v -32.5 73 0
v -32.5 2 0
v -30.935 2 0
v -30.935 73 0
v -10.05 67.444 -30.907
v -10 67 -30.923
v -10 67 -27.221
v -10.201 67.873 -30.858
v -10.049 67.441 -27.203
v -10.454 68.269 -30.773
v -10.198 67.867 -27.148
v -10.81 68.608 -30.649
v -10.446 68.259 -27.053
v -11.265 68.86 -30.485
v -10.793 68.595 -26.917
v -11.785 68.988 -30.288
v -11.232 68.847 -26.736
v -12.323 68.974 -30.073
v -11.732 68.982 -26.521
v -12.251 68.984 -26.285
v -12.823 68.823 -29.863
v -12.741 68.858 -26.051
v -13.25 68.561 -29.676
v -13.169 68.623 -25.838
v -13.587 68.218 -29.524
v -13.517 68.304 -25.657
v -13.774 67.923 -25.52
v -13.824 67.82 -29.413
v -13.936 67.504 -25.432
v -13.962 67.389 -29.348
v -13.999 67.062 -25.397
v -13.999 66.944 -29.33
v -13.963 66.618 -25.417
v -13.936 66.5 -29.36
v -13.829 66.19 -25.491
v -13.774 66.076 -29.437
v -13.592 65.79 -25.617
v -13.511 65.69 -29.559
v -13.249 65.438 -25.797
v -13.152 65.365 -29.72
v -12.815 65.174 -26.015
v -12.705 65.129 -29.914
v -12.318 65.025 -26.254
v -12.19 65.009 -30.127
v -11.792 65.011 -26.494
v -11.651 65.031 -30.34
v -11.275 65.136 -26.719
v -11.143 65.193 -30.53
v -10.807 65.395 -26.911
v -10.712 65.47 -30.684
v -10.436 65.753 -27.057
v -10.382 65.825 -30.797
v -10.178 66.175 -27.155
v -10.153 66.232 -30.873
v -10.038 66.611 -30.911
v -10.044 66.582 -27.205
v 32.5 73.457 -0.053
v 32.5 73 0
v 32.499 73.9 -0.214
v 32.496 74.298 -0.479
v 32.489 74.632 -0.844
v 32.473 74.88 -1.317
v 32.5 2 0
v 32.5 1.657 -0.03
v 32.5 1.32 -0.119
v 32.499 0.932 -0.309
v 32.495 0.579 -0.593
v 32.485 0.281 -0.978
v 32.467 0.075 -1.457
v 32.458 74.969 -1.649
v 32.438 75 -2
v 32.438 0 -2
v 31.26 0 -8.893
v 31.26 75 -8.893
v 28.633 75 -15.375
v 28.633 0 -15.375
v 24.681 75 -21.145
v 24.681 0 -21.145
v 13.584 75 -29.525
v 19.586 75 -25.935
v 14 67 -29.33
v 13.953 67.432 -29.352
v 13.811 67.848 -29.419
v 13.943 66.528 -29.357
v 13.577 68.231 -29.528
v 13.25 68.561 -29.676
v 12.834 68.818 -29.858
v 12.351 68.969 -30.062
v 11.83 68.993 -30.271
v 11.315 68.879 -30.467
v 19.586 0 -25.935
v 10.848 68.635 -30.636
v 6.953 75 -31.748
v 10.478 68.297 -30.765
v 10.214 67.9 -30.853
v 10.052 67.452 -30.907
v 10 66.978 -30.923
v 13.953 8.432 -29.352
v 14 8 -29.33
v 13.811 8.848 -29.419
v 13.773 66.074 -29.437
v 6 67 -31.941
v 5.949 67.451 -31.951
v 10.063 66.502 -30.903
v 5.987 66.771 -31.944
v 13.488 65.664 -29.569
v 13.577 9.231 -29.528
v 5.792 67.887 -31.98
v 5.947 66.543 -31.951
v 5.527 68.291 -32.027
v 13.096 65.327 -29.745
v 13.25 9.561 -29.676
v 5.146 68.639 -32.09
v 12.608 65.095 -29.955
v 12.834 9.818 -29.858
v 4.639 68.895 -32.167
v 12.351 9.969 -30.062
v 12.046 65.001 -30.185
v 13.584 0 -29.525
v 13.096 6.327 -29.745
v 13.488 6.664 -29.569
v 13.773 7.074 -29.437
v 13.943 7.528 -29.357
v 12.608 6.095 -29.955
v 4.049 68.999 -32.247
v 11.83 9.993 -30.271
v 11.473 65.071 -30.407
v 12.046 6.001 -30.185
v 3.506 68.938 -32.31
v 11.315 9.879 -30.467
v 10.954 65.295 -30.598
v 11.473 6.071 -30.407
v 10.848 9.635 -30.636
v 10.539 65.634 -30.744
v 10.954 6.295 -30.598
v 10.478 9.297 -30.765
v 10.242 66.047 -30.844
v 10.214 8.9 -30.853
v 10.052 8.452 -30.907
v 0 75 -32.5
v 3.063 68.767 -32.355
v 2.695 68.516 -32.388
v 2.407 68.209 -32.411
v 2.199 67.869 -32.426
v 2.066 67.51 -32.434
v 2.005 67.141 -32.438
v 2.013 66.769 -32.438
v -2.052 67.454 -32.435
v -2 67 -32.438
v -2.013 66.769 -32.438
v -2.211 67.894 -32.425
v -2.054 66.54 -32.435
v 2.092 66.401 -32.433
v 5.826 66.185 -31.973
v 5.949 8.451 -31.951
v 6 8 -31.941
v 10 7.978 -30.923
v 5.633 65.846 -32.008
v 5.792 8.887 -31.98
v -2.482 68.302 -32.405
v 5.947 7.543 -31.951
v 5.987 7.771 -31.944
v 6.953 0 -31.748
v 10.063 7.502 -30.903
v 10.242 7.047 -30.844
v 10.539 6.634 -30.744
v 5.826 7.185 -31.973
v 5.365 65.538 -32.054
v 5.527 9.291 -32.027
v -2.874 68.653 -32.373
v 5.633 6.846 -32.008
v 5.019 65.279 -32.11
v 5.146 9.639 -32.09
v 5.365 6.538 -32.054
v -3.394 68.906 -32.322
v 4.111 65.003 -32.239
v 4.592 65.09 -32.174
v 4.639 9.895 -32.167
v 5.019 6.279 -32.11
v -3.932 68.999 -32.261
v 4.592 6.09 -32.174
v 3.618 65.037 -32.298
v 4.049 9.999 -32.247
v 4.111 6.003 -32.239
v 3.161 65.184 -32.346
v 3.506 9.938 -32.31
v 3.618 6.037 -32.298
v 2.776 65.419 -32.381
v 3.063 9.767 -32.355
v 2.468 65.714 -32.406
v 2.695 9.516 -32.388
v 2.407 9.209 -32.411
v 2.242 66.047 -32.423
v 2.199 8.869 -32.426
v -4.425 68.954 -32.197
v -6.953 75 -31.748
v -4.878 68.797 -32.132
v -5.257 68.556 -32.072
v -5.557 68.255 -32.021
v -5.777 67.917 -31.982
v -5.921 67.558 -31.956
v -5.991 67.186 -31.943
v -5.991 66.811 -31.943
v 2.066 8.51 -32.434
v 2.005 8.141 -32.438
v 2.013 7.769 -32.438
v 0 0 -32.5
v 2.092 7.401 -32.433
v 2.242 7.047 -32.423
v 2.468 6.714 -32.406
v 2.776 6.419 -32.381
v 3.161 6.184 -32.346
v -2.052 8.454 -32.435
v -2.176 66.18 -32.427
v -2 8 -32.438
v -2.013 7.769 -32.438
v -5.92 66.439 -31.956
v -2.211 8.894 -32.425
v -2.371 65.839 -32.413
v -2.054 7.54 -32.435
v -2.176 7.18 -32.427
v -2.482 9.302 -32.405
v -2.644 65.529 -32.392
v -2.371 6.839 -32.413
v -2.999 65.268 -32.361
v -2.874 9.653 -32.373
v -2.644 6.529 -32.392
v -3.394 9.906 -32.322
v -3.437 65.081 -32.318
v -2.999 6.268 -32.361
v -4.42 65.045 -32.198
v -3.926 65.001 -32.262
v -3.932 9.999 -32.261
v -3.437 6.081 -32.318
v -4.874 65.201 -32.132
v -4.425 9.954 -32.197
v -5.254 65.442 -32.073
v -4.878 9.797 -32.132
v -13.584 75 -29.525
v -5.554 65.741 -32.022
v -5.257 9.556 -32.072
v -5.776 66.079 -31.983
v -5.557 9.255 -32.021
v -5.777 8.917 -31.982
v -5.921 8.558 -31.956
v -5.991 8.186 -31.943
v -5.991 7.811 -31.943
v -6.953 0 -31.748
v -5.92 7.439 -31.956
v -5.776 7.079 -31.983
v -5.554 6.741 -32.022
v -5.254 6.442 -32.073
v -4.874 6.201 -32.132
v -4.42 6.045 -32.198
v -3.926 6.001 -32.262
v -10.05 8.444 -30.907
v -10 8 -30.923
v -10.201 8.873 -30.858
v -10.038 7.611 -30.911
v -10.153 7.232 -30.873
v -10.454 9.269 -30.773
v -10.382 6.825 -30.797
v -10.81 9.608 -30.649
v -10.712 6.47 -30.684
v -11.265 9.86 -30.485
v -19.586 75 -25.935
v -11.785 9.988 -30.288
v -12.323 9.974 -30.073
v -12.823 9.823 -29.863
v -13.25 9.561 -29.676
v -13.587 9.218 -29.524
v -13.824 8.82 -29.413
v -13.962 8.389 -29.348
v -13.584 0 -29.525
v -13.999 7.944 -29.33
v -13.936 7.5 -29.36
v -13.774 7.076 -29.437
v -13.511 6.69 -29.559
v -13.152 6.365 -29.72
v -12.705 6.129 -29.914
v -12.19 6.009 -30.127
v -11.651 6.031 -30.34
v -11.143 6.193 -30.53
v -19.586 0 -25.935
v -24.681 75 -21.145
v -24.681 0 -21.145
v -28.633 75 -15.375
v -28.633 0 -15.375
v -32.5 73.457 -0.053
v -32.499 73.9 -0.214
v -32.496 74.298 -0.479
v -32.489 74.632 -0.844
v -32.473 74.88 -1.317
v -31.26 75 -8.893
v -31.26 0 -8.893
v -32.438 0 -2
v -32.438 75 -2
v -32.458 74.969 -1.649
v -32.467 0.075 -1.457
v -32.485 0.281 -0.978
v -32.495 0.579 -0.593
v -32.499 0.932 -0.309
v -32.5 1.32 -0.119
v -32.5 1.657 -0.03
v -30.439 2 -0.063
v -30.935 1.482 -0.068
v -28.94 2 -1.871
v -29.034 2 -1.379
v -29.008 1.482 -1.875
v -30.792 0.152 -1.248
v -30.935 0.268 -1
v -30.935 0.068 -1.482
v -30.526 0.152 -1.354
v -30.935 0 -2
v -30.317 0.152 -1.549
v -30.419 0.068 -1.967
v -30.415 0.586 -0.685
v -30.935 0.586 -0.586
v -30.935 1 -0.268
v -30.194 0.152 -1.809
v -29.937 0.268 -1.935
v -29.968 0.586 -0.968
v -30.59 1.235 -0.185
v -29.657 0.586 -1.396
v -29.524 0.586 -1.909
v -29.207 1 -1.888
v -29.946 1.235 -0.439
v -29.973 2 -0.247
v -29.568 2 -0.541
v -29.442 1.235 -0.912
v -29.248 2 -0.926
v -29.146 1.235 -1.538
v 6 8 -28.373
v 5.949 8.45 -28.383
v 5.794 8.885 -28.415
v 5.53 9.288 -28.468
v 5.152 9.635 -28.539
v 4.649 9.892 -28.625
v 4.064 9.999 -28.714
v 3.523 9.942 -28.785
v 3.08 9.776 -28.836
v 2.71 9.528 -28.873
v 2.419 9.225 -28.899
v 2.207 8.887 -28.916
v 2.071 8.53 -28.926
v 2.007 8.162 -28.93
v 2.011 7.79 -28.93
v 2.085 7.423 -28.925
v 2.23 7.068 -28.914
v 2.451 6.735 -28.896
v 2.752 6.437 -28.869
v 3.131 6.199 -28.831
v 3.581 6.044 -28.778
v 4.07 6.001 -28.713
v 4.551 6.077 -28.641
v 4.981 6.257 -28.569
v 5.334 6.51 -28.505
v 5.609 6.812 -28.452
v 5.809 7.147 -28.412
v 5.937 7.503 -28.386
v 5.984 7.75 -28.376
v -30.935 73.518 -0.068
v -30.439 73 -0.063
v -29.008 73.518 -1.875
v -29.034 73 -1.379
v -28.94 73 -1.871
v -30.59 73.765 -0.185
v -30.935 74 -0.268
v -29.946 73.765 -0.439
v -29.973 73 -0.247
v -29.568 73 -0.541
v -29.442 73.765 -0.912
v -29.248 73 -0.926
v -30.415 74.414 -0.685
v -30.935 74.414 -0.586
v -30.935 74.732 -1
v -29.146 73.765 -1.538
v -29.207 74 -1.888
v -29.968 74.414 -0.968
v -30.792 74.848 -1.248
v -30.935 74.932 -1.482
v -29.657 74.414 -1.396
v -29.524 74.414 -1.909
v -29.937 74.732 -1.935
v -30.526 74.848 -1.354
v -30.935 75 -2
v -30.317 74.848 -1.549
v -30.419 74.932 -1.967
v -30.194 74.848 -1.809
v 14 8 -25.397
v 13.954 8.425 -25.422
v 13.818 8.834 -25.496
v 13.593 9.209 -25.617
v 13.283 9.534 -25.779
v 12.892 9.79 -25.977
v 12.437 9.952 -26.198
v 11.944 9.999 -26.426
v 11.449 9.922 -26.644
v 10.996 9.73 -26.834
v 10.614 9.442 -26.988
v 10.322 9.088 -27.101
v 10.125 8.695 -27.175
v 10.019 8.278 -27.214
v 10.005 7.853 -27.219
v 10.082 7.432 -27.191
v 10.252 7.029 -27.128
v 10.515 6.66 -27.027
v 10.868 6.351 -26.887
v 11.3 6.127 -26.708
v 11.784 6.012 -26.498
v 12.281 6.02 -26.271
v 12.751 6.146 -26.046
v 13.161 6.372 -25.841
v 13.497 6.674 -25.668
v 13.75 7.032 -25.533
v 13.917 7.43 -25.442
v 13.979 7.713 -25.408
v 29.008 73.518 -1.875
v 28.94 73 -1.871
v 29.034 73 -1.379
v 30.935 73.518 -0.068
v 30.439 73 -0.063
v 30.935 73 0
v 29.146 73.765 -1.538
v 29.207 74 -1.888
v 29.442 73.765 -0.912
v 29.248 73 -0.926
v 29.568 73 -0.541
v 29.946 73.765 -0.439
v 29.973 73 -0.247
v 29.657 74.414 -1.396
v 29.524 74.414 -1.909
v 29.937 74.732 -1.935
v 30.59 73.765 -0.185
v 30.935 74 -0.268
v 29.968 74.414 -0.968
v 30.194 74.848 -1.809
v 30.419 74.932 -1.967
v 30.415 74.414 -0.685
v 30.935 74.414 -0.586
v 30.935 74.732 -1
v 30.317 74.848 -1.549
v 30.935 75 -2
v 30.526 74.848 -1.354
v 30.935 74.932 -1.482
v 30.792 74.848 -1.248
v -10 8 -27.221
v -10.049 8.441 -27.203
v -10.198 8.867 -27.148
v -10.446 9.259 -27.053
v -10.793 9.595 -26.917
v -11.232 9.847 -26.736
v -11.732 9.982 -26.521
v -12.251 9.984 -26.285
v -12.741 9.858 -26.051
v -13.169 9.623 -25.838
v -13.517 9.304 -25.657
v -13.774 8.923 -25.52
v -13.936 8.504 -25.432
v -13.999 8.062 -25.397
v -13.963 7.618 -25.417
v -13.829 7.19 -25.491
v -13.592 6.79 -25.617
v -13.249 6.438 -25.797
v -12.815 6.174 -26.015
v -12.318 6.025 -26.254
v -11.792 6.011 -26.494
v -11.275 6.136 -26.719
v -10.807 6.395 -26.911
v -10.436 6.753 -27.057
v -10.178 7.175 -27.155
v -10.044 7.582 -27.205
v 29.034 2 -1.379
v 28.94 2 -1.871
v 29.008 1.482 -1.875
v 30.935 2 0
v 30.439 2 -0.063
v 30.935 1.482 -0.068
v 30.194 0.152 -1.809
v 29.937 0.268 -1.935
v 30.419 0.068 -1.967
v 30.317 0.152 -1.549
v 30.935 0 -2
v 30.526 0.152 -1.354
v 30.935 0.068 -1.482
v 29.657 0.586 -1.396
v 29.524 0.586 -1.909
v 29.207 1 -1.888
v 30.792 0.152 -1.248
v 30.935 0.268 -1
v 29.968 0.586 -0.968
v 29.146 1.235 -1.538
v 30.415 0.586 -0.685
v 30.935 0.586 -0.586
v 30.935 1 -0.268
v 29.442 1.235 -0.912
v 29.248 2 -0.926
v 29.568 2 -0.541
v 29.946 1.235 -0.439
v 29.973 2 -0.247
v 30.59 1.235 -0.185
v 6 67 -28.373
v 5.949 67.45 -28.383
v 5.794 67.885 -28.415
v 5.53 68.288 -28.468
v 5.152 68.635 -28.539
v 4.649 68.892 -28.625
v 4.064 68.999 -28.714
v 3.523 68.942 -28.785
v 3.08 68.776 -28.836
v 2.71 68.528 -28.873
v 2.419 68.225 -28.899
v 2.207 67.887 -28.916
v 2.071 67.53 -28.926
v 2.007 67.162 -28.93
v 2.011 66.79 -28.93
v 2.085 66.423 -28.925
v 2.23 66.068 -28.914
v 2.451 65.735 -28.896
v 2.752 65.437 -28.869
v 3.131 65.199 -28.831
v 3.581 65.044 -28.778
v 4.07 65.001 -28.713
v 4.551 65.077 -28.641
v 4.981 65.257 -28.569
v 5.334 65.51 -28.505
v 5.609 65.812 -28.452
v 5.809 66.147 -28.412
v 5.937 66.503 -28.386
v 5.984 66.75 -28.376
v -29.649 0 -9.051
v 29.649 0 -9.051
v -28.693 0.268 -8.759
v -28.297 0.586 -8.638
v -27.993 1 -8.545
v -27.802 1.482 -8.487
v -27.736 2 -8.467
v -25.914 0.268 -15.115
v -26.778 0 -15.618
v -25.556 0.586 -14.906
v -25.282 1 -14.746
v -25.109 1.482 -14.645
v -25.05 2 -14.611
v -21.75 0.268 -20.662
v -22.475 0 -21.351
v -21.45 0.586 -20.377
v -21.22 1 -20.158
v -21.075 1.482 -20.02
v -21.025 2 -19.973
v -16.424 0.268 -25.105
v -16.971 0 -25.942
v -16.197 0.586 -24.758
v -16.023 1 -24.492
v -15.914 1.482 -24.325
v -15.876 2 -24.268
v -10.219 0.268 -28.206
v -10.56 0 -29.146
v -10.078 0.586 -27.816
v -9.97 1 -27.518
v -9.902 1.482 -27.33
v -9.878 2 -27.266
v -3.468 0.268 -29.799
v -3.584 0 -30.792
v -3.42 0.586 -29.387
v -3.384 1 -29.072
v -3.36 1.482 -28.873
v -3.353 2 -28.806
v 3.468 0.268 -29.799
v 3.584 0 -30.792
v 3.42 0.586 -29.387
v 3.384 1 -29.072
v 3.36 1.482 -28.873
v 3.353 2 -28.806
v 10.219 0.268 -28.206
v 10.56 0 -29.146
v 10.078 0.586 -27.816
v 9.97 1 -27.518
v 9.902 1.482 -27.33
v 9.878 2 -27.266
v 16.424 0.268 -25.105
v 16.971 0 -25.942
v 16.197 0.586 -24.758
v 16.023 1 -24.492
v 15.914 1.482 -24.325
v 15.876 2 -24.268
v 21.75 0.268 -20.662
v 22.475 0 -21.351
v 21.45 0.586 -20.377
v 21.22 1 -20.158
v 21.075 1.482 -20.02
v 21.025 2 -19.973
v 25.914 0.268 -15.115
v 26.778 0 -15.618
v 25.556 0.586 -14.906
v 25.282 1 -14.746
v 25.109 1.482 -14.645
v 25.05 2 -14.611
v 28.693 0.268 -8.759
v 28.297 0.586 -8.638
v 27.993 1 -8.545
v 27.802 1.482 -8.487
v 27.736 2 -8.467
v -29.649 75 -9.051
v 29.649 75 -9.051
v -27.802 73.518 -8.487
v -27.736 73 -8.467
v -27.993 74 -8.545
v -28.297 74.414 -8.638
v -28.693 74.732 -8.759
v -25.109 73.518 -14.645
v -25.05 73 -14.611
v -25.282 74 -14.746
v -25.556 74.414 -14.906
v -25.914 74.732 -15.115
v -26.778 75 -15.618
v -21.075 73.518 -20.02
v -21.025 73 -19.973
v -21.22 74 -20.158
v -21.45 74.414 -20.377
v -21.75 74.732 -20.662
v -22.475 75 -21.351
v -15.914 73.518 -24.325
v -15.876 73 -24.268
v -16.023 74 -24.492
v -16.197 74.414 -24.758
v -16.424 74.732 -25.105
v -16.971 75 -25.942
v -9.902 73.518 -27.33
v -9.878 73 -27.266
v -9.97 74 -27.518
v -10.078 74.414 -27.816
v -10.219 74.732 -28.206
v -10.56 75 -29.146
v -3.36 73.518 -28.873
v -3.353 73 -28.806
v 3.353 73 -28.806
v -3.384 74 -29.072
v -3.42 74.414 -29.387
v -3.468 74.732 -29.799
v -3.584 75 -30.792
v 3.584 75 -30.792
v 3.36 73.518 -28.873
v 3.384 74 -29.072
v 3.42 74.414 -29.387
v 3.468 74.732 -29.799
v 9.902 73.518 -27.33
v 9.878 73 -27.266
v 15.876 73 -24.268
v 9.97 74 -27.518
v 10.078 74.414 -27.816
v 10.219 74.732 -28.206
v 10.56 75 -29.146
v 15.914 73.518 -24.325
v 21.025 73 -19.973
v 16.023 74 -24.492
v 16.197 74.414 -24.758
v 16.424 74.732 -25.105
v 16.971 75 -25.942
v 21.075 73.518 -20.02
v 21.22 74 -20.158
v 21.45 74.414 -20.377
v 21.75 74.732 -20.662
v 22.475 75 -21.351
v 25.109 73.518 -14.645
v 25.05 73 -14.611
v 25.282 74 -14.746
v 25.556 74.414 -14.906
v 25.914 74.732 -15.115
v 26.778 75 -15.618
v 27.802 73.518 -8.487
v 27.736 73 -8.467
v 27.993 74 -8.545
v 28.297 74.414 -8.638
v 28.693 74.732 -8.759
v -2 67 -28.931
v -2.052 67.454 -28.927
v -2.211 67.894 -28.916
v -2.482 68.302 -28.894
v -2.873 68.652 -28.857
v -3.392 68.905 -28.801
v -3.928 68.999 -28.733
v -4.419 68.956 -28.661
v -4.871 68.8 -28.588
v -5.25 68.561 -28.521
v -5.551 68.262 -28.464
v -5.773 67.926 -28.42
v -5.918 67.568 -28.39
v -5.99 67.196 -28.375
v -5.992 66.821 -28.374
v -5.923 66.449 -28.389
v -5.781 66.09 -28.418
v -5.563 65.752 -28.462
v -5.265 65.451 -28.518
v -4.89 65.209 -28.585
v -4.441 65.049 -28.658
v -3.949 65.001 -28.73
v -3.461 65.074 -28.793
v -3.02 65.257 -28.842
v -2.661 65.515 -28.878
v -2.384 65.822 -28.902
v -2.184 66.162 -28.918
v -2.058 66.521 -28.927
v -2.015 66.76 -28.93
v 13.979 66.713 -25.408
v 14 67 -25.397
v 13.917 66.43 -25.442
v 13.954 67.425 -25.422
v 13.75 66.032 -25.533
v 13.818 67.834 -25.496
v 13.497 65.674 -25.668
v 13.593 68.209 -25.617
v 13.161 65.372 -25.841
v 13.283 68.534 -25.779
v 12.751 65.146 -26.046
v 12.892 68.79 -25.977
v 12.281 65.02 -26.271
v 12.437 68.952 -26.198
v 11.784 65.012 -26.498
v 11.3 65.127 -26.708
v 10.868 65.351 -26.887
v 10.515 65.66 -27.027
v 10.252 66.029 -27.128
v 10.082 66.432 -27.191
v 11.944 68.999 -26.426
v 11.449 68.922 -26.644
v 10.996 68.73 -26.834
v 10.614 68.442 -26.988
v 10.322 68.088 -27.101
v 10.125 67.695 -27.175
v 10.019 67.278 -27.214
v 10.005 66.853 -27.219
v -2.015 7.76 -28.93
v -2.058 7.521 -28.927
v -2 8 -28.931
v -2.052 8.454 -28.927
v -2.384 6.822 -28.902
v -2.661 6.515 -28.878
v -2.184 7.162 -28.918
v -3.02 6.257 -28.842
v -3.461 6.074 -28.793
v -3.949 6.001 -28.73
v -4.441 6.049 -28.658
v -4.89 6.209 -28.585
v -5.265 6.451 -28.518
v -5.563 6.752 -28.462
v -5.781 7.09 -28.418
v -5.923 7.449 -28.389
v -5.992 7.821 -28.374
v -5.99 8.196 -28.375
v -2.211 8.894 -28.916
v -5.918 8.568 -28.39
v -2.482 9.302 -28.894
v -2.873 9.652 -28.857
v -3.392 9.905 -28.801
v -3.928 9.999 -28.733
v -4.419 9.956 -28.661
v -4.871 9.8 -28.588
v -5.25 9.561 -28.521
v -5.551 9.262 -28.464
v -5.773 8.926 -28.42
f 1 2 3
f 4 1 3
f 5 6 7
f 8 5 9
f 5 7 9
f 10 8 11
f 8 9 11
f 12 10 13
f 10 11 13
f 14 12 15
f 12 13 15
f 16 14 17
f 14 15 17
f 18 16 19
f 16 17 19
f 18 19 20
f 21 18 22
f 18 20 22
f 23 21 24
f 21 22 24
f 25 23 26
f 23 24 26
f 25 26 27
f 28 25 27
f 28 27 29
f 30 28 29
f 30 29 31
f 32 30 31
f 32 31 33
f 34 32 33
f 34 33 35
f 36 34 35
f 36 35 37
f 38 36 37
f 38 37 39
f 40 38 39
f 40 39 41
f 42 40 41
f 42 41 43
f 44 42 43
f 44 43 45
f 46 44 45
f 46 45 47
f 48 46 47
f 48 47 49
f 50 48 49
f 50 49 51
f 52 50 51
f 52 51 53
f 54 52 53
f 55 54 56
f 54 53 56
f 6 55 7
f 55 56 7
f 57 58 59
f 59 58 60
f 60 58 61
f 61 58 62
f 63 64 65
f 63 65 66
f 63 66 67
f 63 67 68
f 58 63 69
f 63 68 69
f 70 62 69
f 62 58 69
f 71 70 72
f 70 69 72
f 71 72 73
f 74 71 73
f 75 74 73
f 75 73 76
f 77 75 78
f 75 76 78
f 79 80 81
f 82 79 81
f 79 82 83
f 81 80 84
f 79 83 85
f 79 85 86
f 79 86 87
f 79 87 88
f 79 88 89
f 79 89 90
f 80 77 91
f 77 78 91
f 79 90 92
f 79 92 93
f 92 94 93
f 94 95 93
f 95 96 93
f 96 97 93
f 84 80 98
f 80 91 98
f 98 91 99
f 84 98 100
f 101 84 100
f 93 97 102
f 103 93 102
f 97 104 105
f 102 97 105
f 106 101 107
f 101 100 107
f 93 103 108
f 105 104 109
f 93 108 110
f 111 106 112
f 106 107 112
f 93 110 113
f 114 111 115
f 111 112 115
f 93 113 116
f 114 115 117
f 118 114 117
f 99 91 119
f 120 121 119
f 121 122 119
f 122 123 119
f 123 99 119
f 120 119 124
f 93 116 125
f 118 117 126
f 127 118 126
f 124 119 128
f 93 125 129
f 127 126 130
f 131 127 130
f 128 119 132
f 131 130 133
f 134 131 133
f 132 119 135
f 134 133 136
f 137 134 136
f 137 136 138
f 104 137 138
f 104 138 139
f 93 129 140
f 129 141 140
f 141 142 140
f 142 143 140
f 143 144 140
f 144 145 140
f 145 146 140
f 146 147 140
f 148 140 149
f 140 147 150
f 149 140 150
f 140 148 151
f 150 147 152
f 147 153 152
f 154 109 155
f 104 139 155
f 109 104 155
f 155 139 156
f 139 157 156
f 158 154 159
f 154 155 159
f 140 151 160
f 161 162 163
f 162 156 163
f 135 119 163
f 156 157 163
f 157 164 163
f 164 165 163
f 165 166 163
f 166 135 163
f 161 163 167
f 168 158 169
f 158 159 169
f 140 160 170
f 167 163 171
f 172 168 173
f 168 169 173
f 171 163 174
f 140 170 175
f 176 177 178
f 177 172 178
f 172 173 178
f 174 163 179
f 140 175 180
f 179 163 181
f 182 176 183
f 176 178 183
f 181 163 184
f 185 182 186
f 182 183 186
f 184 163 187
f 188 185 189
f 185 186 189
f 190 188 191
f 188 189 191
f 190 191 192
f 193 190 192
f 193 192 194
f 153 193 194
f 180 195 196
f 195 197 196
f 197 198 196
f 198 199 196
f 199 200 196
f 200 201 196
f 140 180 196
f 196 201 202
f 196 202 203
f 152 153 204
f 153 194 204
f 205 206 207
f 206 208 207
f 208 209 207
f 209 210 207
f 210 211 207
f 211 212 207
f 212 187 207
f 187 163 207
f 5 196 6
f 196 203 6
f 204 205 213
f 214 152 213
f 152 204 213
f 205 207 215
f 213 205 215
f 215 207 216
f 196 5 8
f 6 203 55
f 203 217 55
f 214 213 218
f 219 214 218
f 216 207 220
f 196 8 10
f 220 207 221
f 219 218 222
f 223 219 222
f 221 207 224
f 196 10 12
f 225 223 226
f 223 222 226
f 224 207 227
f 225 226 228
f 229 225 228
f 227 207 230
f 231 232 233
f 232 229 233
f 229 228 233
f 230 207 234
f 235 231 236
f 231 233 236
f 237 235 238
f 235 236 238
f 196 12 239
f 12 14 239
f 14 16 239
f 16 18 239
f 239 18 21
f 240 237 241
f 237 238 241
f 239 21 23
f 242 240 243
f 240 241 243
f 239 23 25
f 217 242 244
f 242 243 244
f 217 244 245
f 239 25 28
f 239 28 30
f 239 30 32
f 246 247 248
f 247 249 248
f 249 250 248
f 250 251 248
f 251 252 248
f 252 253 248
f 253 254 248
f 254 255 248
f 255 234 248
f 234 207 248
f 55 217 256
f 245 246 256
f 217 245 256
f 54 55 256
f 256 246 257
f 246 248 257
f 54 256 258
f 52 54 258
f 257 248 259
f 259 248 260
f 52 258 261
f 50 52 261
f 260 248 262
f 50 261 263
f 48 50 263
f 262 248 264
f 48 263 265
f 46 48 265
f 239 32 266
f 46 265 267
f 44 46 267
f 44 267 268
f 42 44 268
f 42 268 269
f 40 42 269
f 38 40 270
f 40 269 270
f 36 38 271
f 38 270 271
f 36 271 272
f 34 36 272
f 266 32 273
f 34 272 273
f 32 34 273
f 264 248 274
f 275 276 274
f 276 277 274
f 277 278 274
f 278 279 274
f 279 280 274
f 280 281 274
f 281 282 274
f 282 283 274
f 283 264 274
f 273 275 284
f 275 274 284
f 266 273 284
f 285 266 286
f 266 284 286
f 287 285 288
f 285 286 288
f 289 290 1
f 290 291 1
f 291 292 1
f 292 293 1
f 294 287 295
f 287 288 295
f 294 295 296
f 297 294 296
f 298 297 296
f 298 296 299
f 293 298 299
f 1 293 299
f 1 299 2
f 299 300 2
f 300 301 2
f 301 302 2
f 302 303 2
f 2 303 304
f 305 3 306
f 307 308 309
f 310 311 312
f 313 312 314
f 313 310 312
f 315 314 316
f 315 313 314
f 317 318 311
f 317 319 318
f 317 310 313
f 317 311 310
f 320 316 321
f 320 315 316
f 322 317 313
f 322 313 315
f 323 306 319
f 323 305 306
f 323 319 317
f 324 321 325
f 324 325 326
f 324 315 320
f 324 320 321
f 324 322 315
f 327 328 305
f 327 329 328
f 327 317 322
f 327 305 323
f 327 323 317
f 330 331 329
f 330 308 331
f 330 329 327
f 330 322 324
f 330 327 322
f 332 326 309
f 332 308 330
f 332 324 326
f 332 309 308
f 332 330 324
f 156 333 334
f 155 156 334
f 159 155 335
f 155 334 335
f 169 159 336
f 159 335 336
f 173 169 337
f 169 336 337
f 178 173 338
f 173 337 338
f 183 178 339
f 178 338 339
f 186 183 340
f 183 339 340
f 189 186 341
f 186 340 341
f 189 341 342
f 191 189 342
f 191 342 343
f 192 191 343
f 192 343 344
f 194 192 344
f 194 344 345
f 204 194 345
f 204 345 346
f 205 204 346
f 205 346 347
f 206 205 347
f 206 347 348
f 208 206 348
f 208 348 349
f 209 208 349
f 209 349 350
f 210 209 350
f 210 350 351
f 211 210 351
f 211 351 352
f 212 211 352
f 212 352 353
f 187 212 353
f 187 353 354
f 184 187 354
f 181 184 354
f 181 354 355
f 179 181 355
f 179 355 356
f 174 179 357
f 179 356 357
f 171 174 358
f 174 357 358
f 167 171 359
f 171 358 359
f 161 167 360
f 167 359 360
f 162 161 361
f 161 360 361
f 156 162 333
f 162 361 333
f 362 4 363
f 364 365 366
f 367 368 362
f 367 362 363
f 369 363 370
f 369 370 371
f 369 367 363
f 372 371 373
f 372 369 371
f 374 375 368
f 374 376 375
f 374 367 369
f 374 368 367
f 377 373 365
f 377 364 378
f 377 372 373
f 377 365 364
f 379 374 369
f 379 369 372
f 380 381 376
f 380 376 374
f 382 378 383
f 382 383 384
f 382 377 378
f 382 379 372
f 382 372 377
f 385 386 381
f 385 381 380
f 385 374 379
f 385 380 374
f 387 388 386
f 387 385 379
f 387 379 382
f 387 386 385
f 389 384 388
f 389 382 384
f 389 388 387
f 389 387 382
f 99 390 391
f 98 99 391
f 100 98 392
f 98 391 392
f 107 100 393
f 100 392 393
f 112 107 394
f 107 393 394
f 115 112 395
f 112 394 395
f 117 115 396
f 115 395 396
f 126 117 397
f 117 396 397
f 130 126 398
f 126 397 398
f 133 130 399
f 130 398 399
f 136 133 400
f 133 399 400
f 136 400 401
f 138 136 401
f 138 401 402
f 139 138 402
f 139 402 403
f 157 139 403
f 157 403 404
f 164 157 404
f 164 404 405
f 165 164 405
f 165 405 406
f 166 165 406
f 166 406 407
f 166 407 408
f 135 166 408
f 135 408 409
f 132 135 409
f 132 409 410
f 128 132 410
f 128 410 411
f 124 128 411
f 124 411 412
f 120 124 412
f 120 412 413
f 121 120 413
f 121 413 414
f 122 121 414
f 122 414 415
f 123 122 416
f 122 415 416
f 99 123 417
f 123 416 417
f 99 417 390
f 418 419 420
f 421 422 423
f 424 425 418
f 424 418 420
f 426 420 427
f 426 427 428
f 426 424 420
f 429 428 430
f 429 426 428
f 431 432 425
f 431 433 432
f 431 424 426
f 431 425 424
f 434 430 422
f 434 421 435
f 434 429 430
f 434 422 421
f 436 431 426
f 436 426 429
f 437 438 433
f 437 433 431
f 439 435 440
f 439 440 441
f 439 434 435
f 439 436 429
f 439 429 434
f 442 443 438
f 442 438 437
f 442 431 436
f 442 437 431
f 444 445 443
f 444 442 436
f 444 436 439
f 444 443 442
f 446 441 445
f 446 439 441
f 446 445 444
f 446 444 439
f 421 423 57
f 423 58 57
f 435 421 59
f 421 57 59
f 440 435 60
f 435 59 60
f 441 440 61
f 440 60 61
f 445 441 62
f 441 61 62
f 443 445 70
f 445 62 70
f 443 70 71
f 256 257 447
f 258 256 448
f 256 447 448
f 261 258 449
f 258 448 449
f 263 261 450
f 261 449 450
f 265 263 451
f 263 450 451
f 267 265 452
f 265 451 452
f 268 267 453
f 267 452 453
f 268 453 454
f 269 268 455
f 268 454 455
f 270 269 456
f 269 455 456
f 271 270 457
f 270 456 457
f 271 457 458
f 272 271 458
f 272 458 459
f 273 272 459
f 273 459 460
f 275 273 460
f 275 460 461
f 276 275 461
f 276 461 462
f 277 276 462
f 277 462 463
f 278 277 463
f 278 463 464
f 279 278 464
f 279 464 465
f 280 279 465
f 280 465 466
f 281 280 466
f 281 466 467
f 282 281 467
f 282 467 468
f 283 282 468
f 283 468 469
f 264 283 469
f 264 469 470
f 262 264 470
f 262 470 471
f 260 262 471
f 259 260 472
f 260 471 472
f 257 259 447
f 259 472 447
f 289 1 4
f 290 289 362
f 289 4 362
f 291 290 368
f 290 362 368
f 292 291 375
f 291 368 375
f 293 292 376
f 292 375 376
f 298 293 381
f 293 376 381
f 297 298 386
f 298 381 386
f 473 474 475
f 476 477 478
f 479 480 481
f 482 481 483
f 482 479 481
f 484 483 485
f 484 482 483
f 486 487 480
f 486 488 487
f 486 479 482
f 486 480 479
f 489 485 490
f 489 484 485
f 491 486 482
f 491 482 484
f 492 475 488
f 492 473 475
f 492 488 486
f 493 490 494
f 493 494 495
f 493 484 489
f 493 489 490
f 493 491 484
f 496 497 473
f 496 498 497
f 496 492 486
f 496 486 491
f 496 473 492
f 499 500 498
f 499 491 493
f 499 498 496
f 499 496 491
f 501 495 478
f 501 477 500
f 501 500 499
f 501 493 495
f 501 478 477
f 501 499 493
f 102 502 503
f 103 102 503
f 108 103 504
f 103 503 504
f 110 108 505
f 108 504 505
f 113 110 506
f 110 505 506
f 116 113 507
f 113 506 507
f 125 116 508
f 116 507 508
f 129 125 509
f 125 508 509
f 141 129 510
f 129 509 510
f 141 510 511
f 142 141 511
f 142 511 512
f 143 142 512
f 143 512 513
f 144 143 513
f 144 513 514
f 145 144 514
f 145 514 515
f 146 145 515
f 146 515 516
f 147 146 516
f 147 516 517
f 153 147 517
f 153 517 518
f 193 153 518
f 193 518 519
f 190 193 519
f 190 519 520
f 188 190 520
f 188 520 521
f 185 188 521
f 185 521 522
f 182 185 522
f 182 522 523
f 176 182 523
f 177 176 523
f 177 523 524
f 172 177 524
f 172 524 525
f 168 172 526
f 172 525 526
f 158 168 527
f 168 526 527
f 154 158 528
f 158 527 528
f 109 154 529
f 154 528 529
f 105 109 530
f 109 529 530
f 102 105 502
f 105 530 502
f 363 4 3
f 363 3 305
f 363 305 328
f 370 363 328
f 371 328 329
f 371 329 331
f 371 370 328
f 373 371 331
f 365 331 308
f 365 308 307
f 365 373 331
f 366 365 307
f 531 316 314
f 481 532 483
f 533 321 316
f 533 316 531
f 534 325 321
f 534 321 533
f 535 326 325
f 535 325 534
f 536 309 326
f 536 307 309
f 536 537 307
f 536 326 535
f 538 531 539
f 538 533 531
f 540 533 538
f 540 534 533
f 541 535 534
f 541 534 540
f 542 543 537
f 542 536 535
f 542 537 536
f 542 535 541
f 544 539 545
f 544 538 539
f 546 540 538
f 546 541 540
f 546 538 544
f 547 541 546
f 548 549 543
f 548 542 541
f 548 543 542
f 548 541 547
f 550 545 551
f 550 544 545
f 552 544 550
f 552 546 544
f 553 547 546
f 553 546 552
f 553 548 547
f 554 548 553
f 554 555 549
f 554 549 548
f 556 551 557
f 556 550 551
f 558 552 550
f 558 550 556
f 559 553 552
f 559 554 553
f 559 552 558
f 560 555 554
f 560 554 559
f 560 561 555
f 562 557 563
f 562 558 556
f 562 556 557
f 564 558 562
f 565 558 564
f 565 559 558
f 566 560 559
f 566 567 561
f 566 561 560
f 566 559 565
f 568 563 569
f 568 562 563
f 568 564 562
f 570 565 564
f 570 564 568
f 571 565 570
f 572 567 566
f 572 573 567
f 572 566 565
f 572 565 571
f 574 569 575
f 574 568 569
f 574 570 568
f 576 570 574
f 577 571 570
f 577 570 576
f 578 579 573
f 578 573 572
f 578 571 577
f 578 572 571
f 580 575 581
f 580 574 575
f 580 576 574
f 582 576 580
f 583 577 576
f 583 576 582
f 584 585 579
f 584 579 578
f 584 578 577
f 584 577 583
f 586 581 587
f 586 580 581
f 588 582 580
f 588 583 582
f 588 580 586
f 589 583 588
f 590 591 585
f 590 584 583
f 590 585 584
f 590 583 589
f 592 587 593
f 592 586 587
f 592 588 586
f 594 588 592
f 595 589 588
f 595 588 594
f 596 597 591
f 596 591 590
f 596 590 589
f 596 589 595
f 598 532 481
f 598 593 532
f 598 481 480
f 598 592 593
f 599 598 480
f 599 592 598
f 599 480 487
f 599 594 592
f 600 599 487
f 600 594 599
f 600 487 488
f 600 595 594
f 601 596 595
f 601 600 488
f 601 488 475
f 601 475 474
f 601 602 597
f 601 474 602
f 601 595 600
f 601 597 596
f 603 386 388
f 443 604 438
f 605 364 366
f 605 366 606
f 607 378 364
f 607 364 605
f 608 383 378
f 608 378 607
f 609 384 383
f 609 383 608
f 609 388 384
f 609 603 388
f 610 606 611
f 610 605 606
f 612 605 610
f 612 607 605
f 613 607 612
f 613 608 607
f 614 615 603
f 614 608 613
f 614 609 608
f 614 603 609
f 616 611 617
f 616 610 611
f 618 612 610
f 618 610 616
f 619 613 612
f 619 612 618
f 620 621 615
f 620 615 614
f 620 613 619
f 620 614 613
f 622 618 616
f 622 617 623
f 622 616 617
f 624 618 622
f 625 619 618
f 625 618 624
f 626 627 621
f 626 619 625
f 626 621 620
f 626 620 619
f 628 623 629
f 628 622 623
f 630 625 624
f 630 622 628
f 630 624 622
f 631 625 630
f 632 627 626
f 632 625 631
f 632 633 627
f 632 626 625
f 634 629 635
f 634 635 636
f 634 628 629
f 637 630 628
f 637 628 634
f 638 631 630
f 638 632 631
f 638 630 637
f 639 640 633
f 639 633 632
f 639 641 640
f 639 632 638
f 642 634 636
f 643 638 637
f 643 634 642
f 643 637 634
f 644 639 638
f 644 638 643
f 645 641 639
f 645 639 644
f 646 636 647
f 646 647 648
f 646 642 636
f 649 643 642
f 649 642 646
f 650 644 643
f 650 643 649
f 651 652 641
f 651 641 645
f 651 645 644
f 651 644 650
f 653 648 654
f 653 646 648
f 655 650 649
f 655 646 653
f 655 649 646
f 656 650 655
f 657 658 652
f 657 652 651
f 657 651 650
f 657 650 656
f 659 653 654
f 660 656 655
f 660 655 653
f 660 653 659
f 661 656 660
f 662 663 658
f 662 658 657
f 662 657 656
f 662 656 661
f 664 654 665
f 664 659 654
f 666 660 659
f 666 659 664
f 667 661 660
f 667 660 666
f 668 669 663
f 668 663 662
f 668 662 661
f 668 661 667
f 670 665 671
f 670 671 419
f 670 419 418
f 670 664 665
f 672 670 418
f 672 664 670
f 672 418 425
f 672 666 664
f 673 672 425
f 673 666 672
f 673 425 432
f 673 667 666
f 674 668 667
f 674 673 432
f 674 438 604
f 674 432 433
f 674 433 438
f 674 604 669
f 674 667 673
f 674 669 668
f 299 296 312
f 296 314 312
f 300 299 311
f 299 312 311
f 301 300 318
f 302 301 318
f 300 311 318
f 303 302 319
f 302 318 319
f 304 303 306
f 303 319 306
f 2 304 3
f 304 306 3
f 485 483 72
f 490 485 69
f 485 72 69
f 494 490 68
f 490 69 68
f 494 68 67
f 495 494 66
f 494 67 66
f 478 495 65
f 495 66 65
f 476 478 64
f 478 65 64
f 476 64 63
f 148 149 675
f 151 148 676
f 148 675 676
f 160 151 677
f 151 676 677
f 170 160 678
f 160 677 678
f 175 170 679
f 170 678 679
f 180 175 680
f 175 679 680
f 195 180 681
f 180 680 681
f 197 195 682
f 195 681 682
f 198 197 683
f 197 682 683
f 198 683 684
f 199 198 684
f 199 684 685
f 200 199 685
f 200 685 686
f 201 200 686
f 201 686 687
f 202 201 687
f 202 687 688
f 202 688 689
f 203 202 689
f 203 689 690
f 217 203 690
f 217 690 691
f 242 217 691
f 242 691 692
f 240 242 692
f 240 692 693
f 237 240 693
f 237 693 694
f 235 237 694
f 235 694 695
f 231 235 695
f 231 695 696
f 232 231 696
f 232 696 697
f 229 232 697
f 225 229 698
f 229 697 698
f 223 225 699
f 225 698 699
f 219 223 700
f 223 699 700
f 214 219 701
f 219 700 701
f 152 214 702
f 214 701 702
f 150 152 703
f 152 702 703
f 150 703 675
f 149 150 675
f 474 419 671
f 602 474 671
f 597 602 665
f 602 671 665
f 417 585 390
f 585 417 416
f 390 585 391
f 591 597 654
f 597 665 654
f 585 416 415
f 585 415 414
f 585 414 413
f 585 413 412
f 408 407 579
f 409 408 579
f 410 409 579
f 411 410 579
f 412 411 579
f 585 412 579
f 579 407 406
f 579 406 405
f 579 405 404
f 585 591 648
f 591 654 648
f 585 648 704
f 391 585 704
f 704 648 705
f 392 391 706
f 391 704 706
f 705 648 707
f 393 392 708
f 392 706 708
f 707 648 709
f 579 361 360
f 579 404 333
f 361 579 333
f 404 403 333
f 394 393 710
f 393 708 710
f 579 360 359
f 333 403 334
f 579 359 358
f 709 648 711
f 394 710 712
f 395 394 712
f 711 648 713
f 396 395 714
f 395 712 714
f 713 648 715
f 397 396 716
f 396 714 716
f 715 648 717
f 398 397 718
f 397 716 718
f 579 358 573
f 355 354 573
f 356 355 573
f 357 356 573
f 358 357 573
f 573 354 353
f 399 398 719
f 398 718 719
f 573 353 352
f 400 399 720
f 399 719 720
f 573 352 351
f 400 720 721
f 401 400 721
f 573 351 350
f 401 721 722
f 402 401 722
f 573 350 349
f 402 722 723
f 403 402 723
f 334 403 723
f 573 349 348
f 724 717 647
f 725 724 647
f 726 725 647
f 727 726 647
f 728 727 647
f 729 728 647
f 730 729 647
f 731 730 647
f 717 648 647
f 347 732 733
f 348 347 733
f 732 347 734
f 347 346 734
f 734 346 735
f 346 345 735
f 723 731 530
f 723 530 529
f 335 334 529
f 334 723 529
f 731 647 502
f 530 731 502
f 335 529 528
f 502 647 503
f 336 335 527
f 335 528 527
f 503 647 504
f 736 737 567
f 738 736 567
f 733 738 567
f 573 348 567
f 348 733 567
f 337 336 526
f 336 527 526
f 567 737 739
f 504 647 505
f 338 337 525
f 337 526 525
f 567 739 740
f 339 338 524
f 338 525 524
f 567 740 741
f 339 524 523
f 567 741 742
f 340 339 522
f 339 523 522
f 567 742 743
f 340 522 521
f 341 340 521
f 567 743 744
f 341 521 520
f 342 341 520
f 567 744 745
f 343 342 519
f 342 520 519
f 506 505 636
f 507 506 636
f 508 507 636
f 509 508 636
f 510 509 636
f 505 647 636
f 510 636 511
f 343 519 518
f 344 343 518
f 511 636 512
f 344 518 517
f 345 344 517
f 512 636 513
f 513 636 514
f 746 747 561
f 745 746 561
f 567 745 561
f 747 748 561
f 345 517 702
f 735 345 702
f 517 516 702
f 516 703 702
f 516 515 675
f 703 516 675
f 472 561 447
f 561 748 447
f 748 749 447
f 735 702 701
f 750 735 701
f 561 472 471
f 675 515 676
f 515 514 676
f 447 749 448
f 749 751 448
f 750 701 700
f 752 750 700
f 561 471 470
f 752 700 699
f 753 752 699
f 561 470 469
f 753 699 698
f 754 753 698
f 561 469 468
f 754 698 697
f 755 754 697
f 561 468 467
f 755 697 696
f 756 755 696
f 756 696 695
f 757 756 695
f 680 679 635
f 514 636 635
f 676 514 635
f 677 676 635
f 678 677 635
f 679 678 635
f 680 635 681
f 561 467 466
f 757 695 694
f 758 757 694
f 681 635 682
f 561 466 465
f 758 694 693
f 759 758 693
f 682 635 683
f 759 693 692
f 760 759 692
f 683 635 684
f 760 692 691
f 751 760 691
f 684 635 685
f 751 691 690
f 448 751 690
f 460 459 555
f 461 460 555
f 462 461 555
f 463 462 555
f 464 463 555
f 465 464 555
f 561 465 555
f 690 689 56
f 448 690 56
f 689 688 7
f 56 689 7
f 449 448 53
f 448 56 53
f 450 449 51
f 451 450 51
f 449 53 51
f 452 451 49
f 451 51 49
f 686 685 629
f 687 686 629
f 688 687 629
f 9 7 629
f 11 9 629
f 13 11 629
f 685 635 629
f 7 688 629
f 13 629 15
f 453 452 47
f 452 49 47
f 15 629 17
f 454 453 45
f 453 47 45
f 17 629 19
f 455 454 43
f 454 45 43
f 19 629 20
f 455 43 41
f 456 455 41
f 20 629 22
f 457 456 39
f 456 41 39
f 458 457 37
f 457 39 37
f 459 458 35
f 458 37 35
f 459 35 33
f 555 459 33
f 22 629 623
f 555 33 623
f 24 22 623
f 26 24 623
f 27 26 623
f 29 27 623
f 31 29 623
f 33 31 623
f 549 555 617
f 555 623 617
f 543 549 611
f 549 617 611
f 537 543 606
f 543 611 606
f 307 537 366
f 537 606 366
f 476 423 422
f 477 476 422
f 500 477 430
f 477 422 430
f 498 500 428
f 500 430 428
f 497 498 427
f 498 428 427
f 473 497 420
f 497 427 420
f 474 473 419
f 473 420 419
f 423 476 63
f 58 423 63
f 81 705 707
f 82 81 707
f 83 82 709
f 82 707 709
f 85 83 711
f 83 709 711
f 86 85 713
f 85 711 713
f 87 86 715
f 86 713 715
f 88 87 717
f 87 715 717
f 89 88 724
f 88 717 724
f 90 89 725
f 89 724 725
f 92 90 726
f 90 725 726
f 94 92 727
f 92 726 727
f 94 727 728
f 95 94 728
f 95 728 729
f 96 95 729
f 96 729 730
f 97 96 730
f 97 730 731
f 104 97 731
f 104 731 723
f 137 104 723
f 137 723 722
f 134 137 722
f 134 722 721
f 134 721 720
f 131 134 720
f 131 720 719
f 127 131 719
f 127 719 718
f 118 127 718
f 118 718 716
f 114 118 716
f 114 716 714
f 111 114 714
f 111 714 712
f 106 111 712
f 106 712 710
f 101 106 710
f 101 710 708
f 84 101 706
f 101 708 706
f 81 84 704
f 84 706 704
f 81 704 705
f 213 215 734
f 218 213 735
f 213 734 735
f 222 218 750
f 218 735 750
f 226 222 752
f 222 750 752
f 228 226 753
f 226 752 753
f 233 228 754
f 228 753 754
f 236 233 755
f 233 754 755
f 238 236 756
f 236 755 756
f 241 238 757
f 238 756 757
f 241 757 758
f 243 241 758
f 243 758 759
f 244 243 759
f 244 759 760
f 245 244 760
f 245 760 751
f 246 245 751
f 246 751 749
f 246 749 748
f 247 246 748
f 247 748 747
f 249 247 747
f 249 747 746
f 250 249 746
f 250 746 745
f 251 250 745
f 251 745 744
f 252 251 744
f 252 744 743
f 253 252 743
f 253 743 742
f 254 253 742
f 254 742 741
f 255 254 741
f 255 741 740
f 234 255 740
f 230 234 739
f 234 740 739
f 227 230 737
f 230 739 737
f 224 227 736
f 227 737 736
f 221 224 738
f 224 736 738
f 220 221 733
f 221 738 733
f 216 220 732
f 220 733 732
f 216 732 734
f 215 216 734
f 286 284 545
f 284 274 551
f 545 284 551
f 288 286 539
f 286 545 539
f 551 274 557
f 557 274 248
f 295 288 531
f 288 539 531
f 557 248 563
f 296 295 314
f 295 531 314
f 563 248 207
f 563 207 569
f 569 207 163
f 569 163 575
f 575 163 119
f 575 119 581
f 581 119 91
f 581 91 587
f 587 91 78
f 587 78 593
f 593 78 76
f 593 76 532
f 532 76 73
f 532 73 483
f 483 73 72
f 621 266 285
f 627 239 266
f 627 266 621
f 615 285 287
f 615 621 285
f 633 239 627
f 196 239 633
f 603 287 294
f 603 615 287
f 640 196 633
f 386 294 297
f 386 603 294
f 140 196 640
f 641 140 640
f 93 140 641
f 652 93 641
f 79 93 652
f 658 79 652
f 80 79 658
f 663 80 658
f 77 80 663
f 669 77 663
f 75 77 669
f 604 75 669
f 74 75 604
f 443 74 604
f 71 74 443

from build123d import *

# Parameters (mm, degrees)
SKETCH_2_R          = 32.5
EXTRUDE_1_DEPTH     = 75
SKETCH_3_R          = 29
CUT_EXTRUDE_1_DEPTH = 142.5
SKETCH_4_W          = 65
SKETCH_4_H          = 75
CUT_EXTRUDE_2_DEPTH = 50
SKETCH_5_R          = 2
CUT_EXTRUDE_3_DEPTH = 50
FILLET_1_R          = 2
FILLET_2_R          = 2
FILLET_3_R          = 2


with BuildPart() as part:
    # 草圖2 → 填料-伸長1 (new body)
    with BuildSketch(Plane(origin=(0, 0, 0), x_dir=(1, 0, 0), z_dir=(0, 1, 0))):
        with Locations(Location((0, 0, 0), (0, 0, 270))):
            Circle(SKETCH_2_R)
    extrude(amount=EXTRUDE_1_DEPTH)

    # 草圖3 → 除料-伸長1 (cut, symmetric)
    with BuildSketch(Plane(origin=(0, 75, 0), x_dir=(1, 0, 0), z_dir=(0, 1, 0))):
        with Locations(Location((0, 0, 0), (0, 0, 270))):
            Circle(SKETCH_3_R)
    extrude(amount=CUT_EXTRUDE_1_DEPTH, both=True, mode=Mode.SUBTRACT)

    # 草圖4 → 除料-伸長2 (cut)
    with BuildSketch(Plane.XY):
        with Locations((0, 37.5)):
            Rectangle(SKETCH_4_W, SKETCH_4_H)
    extrude(amount=CUT_EXTRUDE_2_DEPTH, mode=Mode.SUBTRACT)

    # 草圖5 → 除料-伸長3 (cut)
    with BuildSketch(Plane.XY):
        with Locations((-4, 67)):
            Circle(SKETCH_5_R)
        with Locations((4, 67)):
            Circle(SKETCH_5_R)
        with Locations((12, 67)):
            Circle(SKETCH_5_R)
        with Locations((-12, 67)):
            Circle(SKETCH_5_R)
        with Locations((-12, 8)):
            Circle(SKETCH_5_R)
        with Locations((12, 8)):
            Circle(SKETCH_5_R)
        with Locations((4, 8)):
            Circle(SKETCH_5_R)
        with Locations((-4, 8)):
            Circle(SKETCH_5_R)
    extrude(amount=-CUT_EXTRUDE_3_DEPTH, mode=Mode.SUBTRACT)

    # 圓角1
    fillet_1_edges = [part.edges().sort_by_distance(p)[0] for p in [
        (-29, 37.5, 0),
        (29, 37.5, 0),
    ]]
    fillet(fillet_1_edges, radius=FILLET_1_R)

    # 圓角2
    fillet_2_edges = [part.edges().sort_by_distance(p)[0] for p in [
        (31.717708298, 75, 0),
        (0, 75, -29),
        (-31.717708298, 75, 0),
        (-29.567583368, 75, -0.540879629),
        (29.567583368, 75, -0.540879629),
    ]]
    fillet(fillet_2_edges, radius=FILLET_2_R)

    # 圓角3
    fillet_3_edges = [part.edges().sort_by_distance(p)[0] for p in [
        (-31.717708298, 0, 0),
        (31.717708298, 0, 0),
        (0, 0, -29),
        (-29.567583368, 0, -0.540879629),
        (29.567583368, 0, -0.540879629),
    ]]
    fillet(fillet_3_edges, radius=FILLET_3_R)


solid = part.part
